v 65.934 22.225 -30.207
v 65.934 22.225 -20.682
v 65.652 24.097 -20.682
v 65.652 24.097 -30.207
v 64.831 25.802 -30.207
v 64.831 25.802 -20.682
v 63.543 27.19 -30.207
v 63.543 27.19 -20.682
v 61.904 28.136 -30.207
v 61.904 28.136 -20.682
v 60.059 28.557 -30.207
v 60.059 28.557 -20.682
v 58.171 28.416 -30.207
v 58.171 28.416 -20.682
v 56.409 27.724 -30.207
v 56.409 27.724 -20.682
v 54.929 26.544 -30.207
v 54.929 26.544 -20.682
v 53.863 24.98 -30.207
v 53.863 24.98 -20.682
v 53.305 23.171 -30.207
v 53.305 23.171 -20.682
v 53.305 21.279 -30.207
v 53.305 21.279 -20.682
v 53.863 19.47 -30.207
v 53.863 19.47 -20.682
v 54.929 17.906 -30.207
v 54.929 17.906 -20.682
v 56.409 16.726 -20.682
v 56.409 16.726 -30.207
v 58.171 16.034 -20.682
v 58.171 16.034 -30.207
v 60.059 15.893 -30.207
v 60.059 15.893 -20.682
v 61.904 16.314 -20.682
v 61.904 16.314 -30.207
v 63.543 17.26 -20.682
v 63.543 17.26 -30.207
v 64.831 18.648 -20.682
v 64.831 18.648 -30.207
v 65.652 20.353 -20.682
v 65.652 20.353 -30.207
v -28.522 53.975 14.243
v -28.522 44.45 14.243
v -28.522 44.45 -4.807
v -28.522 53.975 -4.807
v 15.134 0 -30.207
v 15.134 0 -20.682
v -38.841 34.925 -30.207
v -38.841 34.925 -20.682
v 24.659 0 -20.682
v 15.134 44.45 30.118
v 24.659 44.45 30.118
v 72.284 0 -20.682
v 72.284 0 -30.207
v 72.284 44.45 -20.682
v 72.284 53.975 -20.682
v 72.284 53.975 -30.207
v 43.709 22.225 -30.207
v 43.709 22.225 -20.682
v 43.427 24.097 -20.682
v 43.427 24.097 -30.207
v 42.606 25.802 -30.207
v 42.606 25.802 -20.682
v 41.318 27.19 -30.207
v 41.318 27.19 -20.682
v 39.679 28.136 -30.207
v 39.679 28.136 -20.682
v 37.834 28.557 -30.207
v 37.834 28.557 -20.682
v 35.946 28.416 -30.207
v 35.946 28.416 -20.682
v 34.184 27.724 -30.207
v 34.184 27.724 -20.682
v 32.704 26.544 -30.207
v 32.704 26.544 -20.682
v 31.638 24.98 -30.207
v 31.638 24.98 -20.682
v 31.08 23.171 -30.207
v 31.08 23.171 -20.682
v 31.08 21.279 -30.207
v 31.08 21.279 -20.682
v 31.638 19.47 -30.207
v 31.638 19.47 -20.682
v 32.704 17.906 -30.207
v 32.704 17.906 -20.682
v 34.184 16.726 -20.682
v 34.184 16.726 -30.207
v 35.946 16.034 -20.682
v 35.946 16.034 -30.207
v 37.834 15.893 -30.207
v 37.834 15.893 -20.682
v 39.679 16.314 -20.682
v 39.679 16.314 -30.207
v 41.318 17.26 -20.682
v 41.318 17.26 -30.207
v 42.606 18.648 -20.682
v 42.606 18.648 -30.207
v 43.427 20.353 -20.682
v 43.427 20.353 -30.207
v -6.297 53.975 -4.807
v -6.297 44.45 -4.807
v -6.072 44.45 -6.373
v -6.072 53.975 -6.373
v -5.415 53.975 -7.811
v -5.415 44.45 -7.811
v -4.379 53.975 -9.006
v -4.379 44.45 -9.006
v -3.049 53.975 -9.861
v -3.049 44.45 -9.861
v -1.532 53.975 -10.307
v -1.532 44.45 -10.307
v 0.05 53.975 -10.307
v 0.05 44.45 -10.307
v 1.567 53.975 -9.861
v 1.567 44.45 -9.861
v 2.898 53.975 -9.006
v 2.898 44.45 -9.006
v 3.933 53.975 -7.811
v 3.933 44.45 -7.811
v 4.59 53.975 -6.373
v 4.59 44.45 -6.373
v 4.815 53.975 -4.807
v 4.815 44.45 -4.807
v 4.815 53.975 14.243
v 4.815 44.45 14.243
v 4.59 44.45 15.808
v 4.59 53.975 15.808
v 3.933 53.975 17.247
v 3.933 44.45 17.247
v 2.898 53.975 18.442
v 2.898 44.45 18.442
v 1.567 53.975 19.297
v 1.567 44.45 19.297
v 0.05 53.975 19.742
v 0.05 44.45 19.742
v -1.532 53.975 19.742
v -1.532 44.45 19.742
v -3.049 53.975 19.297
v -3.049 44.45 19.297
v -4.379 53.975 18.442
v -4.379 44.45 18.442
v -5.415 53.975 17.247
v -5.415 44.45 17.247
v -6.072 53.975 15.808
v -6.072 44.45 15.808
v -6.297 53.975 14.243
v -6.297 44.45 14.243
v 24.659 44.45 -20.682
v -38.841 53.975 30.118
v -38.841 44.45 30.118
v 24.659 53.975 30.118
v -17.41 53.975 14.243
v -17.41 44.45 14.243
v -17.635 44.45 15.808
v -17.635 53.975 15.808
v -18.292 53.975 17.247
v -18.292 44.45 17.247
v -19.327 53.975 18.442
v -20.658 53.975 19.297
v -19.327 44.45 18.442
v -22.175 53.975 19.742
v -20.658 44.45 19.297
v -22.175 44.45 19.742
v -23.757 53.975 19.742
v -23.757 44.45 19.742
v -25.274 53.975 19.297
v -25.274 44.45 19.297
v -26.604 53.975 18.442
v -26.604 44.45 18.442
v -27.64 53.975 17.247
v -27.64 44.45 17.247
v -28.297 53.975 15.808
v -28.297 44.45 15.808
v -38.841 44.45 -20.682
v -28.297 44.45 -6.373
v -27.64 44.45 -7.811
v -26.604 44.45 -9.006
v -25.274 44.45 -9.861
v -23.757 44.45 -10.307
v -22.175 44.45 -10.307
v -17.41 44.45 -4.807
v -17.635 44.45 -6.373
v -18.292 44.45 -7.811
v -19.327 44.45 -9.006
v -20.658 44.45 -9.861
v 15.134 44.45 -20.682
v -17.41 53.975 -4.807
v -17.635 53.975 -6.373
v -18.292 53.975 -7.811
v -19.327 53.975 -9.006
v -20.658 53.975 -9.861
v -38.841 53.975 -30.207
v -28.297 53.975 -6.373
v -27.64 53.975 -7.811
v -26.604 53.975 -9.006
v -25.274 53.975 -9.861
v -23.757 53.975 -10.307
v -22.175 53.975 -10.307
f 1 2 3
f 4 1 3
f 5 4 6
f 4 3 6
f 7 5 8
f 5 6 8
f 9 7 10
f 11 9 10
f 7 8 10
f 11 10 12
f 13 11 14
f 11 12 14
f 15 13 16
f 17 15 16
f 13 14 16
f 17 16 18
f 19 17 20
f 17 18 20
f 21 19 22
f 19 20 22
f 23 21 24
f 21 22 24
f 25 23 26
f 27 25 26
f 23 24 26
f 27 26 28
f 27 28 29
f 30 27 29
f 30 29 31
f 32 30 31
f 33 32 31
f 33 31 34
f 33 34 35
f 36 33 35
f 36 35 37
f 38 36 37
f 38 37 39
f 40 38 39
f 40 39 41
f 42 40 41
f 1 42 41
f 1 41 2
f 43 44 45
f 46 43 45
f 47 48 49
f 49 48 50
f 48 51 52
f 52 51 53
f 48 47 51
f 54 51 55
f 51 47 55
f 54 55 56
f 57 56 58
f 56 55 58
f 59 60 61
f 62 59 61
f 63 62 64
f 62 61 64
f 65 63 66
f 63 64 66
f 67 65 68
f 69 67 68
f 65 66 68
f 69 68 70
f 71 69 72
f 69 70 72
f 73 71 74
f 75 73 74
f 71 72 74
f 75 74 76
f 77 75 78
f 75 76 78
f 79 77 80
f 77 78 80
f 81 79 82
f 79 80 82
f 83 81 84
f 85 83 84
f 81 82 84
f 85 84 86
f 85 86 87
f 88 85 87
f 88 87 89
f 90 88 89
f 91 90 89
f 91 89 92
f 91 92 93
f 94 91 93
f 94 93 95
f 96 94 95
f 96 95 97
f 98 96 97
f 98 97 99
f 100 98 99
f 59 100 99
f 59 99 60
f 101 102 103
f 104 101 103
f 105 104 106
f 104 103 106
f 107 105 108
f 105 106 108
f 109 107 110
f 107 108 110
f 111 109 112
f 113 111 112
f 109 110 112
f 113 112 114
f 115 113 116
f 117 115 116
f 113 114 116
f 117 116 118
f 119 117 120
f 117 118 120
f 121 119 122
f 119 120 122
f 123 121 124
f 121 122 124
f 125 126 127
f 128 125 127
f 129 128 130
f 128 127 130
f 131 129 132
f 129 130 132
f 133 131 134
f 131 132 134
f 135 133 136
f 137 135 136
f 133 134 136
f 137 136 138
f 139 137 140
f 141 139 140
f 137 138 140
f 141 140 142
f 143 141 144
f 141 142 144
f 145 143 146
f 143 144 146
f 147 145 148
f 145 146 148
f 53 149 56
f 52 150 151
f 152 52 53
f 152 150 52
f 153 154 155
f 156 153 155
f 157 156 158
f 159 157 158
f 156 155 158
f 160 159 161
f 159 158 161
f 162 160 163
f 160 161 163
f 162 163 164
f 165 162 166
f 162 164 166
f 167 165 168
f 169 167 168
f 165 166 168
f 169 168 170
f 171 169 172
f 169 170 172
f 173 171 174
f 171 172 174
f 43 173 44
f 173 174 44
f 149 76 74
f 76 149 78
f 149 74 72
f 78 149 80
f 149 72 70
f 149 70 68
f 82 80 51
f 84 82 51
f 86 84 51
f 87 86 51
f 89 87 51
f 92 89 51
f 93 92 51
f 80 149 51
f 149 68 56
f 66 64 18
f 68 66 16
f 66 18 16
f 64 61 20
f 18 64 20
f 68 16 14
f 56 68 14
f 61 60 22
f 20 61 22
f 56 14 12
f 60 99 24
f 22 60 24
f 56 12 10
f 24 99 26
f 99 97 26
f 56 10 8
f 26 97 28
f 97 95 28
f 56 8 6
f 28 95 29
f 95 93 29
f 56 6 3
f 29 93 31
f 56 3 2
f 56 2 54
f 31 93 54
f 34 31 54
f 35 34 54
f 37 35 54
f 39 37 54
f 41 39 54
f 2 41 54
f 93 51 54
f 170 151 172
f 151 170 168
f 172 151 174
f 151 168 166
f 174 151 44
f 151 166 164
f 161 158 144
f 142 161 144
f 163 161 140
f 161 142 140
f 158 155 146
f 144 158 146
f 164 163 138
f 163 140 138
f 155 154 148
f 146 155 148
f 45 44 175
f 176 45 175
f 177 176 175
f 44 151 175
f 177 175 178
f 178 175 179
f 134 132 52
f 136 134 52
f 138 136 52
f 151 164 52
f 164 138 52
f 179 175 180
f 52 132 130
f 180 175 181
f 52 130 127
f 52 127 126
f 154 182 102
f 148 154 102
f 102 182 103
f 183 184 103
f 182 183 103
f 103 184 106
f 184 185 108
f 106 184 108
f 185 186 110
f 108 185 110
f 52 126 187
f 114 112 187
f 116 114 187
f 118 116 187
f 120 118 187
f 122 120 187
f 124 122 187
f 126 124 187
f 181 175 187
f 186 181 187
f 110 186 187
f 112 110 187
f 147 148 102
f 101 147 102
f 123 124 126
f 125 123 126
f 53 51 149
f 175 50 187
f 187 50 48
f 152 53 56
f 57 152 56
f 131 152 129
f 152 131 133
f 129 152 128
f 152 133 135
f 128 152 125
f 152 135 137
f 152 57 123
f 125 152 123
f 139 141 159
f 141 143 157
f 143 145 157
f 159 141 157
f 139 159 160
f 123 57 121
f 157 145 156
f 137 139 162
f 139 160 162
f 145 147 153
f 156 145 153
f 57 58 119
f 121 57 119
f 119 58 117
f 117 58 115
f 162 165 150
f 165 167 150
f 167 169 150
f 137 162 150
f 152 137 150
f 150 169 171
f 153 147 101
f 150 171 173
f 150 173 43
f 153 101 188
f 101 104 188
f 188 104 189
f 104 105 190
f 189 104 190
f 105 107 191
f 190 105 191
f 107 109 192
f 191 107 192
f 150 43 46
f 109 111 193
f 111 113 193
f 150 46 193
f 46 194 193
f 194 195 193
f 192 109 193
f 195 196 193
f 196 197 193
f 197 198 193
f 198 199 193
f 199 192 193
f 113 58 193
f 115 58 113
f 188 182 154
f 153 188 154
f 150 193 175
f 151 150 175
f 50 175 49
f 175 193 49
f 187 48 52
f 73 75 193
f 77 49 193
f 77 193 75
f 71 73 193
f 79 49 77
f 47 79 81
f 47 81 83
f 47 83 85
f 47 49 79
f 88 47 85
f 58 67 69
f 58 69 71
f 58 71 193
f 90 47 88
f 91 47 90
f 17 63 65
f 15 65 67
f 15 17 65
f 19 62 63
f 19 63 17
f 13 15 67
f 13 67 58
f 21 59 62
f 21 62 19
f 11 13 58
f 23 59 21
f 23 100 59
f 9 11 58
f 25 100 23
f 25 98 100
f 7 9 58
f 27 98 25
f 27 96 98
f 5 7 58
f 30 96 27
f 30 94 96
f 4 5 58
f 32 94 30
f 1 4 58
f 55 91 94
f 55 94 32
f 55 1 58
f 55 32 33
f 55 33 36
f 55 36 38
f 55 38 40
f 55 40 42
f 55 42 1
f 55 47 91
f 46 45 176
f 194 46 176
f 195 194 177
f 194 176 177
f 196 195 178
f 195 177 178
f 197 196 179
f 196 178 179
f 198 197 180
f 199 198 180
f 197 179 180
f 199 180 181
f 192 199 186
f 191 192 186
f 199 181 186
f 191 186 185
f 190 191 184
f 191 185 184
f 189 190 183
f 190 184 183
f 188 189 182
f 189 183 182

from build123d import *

# Parameters (mm, degrees)
F0_W      = 111.125
F0_H      = 9.525
F1_DEPTH  = 53.975
F3_DEPTH  = 9.526
F4_W      = 9.525
F4_H      = 44.45
F5_DEPTH  = 50.8
F7_DEPTH  = 63.501
F9_DEPTH  = 9.526
F10_R     = 6.35
F11_DEPTH = 9.526
F13_DEPTH = 9.526


with BuildPart() as f1:
    # F0 (on Front) → F1 (new body)
    with BuildSketch(Plane.XZ):
        with Locations((16.7216053668, -25.4447730258)):
            Rectangle(F0_W, F0_H)
    extrude(amount=-F1_DEPTH)

    # F2 (on face) → F3 (cut, through all)
    with BuildSketch(Plane.XY.offset(-20.6822730258)):
        Polygon((15.1341053668, 0), (-38.8408946332, 34.925), (-38.8408946332, 0), align=None)
    extrude(amount=-F3_DEPTH, mode=Mode.SUBTRACT)

    # F4 (on face) → F5 (join)
    with BuildSketch(Plane.XY.offset(-20.6822730258)):
        with Locations((19.8966053668, 22.225)):
            Rectangle(F4_W, F4_H)
        Polygon((72.2841053668, 44.45), (72.2841053668, 53.975), (-38.8408946332, 53.975), (-38.8408946332, 44.45), (15.1341053668, 44.45), (24.6591053668, 44.45), align=None)
    extrude(amount=F5_DEPTH)

    # F6 (on face) → F7 (cut, through all)
    with BuildSketch(Plane.YZ.offset(24.6591053668)):
        Polygon((0, 30.1177269742), (0, -20.6822730258), (44.45, 30.1177269742), align=None)
    extrude(amount=-F7_DEPTH, mode=Mode.SUBTRACT)

    # F8 (on face) → F9 (cut, through all)
    with BuildSketch(Plane.XZ.offset(-44.45)):
        Polygon((72.2841053668, 30.1177269742), (24.6591053668, 30.1177269742), (72.2841053668, -20.6822730258), align=None)
    extrude(amount=-F9_DEPTH, mode=Mode.SUBTRACT)

    # F10 (on face) → F11 (cut, through all)
    with BuildSketch(Plane.XY.offset(-20.6822730258)):
        with Locations((37.3591053668, 22.225)):
            Circle(F10_R)
        with Locations((59.5841053668, 22.225)):
            Circle(F10_R)
    extrude(amount=-F11_DEPTH, mode=Mode.SUBTRACT)

    # F12 (on face) → F13 (cut, through all)
    with BuildSketch(Plane.XZ.offset(-44.45)):
        Polygon((-22.9658946332, 14.2427269742), (-28.5221446332, 14.2427269742), (-28.5221446332, -4.8072730258), (-17.4096446332, -4.8072730258), (-17.4096446332, 14.2427269742), align=None)
        with BuildLine():
            ThreePointArc((-17.4096446332, 14.2427269742), (-22.9658946332, 19.7989769742), (-28.5221446332, 14.2427269742))
            Line((-28.5221446332, 14.2427269742), (-22.9658946332, 14.2427269742))
            Line((-22.9658946332, 14.2427269742), (-17.4096446332, 14.2427269742))
        make_face()
        with BuildLine():
            Line((4.8153553668, -4.8072730258), (-6.2971446332, -4.8072730258))
            ThreePointArc((-6.2971446332, -4.8072730258), (-0.7408946332, -10.3635230258), (4.8153553668, -4.8072730258))
        make_face()
        Polygon((-0.7408946332, 14.2427269742), (-6.2971446332, 14.2427269742), (-6.2971446332, -4.8072730258), (4.8153553668, -4.8072730258), (4.8153553668, 14.2427269742), align=None)
        with BuildLine():
            ThreePointArc((4.8153553668, 14.2427269742), (-0.7408946332, 19.7989769742), (-6.2971446332, 14.2427269742))
            Line((-6.2971446332, 14.2427269742), (-0.7408946332, 14.2427269742))
            Line((-0.7408946332, 14.2427269742), (4.8153553668, 14.2427269742))
        make_face()
        with BuildLine():
            Line((-17.4096446332, -4.8072730258), (-28.5221446332, -4.8072730258))
            ThreePointArc((-28.5221446332, -4.8072730258), (-22.9658946332, -10.3635230258), (-17.4096446332, -4.8072730258))
        make_face()
    extrude(amount=-F13_DEPTH, mode=Mode.SUBTRACT)


solid = f1.part
